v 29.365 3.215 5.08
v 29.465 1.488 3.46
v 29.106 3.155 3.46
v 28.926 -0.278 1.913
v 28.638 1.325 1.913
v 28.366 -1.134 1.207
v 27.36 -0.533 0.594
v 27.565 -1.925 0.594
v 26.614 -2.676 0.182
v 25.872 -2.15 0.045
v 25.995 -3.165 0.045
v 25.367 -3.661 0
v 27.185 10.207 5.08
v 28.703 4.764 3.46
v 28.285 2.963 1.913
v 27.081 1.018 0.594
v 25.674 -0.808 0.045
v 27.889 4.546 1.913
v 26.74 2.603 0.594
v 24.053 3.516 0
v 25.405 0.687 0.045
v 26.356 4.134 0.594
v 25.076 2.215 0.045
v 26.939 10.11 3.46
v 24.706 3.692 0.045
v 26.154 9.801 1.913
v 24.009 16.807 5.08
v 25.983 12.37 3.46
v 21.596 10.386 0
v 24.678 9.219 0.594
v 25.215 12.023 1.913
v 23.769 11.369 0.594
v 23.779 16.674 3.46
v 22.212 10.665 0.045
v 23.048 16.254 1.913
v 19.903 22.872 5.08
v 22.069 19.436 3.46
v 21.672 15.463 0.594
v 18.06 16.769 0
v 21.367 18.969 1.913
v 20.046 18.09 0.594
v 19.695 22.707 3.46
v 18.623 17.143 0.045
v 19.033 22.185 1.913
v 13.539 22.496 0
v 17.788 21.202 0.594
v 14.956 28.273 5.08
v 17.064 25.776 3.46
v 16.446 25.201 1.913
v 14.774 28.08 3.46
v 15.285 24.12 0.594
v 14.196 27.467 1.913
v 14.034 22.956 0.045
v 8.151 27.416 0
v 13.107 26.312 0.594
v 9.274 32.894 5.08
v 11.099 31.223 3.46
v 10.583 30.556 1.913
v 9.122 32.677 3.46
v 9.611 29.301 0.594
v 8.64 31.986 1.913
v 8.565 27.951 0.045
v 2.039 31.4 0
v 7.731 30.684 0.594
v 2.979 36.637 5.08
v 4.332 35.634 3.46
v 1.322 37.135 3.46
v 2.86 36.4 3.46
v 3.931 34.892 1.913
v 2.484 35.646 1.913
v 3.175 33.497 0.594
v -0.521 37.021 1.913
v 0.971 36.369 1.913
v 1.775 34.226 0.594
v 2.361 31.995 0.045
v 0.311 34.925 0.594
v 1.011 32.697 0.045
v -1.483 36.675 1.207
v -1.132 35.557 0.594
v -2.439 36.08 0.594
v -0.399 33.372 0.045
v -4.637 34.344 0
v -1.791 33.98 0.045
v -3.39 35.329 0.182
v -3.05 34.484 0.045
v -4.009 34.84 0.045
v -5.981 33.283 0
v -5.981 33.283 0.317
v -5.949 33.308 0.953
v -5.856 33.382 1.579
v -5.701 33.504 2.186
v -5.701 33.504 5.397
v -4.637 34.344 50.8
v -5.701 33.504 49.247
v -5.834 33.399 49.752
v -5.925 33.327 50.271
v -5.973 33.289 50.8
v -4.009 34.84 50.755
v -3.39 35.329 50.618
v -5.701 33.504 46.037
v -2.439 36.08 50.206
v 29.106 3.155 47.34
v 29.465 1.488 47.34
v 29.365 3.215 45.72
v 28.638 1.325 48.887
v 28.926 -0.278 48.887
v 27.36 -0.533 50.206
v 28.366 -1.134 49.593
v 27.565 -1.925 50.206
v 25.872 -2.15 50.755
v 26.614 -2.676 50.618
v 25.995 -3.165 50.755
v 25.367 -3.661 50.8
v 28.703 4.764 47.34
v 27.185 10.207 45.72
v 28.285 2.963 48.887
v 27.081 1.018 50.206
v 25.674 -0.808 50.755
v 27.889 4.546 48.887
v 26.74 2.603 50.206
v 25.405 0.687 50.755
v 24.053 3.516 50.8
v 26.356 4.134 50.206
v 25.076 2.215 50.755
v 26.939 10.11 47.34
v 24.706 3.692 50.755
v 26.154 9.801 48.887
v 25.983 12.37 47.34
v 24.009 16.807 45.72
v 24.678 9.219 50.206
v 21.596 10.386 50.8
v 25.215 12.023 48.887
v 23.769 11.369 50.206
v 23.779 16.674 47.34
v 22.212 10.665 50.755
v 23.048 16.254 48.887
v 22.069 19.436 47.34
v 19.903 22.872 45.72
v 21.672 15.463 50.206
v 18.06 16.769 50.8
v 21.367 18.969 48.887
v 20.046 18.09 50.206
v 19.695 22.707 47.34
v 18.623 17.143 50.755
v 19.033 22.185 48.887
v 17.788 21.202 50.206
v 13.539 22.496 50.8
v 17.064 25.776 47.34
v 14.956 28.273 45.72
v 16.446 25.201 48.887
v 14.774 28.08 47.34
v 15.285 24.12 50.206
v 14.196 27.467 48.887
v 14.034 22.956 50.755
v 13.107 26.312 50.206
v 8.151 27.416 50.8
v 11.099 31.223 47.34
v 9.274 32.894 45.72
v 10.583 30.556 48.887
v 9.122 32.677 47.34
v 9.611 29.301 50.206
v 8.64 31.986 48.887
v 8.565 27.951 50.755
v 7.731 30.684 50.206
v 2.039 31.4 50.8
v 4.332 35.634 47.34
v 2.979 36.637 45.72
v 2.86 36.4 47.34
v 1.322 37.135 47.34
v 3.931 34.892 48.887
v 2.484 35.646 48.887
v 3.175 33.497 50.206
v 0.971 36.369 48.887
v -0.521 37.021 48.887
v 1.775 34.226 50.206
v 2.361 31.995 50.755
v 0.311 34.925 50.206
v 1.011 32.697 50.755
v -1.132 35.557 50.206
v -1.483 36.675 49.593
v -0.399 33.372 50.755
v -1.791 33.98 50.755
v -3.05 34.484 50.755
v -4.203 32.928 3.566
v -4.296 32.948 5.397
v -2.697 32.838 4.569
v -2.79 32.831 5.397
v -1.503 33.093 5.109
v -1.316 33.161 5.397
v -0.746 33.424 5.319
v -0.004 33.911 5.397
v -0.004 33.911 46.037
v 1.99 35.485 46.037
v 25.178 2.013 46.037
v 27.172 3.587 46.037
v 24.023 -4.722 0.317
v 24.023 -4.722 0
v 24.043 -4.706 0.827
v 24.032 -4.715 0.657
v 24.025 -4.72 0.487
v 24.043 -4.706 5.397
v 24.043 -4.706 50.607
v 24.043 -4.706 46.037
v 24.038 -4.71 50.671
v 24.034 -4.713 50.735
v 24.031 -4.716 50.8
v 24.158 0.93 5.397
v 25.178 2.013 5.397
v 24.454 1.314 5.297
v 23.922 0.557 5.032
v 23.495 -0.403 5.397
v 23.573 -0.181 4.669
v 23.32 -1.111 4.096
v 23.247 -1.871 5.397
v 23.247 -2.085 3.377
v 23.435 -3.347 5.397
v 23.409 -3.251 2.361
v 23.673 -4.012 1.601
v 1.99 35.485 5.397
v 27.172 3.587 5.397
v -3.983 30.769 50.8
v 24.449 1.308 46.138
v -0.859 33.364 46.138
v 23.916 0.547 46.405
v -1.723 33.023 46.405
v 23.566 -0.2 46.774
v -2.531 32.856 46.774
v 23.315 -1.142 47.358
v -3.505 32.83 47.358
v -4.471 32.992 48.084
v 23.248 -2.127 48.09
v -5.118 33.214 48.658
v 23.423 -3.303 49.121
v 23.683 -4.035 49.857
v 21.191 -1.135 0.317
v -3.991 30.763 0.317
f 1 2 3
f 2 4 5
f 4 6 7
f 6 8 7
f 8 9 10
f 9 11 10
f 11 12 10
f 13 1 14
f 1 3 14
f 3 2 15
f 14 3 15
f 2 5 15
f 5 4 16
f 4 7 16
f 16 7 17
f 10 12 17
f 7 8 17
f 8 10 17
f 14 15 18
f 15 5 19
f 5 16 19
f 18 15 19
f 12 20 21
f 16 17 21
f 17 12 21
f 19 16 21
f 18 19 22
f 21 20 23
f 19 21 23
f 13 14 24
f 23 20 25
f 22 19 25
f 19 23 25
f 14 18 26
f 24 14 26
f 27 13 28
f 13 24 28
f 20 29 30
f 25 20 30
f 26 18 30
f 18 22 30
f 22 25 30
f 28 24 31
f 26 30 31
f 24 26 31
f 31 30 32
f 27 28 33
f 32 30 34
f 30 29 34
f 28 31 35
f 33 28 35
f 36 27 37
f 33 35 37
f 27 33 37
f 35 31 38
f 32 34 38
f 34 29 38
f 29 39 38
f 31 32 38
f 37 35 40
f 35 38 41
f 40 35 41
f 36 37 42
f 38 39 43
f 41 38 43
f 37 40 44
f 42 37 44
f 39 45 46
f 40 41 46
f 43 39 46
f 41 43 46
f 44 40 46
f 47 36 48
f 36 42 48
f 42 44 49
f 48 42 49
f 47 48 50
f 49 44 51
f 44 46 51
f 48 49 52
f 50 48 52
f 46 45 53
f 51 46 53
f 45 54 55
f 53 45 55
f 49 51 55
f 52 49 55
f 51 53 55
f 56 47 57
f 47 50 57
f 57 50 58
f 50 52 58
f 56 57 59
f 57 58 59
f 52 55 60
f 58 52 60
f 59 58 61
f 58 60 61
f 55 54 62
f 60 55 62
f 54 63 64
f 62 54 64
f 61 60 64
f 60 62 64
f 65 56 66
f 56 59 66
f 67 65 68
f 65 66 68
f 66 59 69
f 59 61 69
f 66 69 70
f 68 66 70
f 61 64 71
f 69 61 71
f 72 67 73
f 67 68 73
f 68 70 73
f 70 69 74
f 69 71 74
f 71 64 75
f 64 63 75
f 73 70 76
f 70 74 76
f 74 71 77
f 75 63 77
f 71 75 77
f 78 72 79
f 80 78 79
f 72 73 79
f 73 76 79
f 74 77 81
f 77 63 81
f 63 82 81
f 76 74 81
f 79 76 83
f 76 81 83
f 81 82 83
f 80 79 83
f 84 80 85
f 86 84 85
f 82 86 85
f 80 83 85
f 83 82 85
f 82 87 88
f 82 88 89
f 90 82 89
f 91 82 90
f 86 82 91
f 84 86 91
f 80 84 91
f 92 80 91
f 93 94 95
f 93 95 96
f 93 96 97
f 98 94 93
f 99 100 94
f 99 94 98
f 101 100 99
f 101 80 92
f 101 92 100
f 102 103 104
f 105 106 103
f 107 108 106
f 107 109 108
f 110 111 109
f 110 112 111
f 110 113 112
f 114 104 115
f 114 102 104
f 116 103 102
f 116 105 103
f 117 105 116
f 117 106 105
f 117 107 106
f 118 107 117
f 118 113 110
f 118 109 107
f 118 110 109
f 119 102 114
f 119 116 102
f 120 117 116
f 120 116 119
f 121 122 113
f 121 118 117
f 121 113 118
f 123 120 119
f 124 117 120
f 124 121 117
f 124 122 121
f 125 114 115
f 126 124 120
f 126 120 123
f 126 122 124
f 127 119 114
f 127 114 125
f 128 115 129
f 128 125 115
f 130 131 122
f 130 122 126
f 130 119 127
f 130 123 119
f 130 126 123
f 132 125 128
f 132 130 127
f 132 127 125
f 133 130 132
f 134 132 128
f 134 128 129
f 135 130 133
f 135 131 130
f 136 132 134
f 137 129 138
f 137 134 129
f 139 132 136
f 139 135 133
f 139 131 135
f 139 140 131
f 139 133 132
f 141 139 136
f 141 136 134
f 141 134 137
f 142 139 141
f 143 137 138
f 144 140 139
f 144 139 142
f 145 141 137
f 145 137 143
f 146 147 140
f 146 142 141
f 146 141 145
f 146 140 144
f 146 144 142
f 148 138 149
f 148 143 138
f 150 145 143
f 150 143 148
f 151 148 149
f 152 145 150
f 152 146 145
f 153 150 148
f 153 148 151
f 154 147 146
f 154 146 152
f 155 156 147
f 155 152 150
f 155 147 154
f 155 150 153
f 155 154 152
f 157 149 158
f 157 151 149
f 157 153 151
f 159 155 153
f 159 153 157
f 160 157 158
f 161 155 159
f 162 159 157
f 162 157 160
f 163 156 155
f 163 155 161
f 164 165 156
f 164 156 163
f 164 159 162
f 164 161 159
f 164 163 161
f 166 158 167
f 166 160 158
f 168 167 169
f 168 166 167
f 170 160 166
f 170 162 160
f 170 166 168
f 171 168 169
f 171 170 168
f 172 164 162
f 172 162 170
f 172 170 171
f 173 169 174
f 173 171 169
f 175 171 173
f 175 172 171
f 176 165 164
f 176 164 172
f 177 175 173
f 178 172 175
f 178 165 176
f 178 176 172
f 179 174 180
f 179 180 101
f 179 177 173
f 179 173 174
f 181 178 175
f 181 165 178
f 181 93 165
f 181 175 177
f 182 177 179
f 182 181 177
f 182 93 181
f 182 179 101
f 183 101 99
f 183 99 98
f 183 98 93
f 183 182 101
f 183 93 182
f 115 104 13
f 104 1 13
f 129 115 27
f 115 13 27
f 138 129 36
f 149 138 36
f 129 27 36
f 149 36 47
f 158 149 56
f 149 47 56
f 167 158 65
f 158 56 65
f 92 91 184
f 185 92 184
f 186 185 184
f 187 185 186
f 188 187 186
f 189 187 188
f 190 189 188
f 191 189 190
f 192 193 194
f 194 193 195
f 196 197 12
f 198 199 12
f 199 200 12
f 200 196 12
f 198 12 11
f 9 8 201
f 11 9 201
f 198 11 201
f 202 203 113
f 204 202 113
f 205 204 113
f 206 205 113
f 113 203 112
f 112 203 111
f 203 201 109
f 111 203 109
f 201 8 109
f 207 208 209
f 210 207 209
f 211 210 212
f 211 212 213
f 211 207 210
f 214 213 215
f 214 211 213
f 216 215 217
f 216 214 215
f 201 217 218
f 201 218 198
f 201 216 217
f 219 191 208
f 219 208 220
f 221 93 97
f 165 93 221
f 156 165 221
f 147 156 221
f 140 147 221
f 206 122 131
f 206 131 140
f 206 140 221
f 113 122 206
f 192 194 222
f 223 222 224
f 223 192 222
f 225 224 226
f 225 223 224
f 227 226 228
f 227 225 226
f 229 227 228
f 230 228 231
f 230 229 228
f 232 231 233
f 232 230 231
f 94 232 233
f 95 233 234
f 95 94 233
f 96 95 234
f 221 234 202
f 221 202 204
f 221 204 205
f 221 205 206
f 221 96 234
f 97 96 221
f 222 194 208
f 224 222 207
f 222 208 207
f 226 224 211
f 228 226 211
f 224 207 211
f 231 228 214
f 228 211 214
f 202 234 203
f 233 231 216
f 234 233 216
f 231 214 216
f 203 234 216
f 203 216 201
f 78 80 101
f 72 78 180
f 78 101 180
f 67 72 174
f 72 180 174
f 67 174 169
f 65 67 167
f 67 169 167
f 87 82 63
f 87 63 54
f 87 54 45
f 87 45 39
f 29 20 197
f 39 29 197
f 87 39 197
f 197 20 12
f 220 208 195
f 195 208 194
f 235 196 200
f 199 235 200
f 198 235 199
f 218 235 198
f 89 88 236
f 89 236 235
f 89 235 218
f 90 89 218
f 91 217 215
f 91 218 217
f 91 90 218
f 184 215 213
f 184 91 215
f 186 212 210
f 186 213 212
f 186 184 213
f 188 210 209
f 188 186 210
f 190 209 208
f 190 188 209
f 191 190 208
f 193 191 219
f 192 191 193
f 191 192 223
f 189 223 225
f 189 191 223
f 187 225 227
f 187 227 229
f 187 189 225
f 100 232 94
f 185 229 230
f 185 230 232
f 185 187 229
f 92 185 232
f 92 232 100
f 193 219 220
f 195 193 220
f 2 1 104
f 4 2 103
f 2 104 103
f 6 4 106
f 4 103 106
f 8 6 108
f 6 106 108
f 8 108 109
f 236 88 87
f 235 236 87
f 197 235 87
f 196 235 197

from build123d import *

# Parameters (mm, degrees)
F1_DEPTH     = 50.8
F2_W         = 48.4209248795
F2_H         = 50.8
F2_W_2       = 40.64
F2_H_2       = 40.64
F3_DEPTH     = 7.62
F4_T1_DEPTH  = 40.64
F4_T3_DEPTH  = 40.64
F4_T9_DEPTH  = 53.34
F4_T15_DEPTH = 53.34
F4_T24_DEPTH = 53.34
F4_T30_DEPTH = 53.34
F5_T1_DEPTH  = 40.64
F5_T6_DEPTH  = 17.2700101558
F5_S7_R      = 5.0800000001
F5_T8_DEPTH  = 13
F5_T12_DEPTH = 15.9109147238
F5_S13_R     = 5.0800000001
F5_T14_DEPTH = 12
F6_R         = 5.08


# Not quite as in the source:
# - a fillet or chamfer that OpenCascade refuses, or shapes differently, is made with other operations: its cross-section is extruded or revolved along the edge and cut away or added


with BuildPart() as f1:
    # F0 (on Top) → F1 (new body)
    with BuildSketch(Plane.XY):
        with BuildLine():
            Line((0, 38.0047485232), (30.0037506968, 0))
            ThreePointArc((30.0037506968, 0), (19.9032134253, 22.871851931), (0, 38.0047485232))
        make_face()
    extrude(amount=F1_DEPTH)

    # F2 (on face) → F3 (join)
    with BuildSketch(Plane(origin=(18.4835383706, 14.5922680406, 0), x_dir=(0.6196443123, -0.7848827468, 0), z_dir=(-0.7848827468, -0.6196443123, 0))):
        with Locations((-5.6188089735, 25.4)):
            Rectangle(F2_W, F2_H)
        with Locations((-6.2983566895, 25.7165116596)):
            Rectangle(F2_W_2, F2_H_2, mode=Mode.SUBTRACT)
    extrude(amount=F3_DEPTH)

    # F4: fillet of radius 5.08 on 3 edges, made by hand

    # F4_s2 → F4_t1 (cut)
    with BuildSketch(Plane(origin=(-16.4939133248, 20.8922889144, 0), x_dir=(0, 0, 1), z_dir=(0.6196443123, -0.7848827468, 0))):
        with BuildLine():
            ThreePointArc((46.0365116596, -21.0094262619), (47.5244092112, -17.4173238135), (51.1165116596, -15.9294262619))
            Line((51.1165116596, -15.9294262619), (46.0365116596, -15.9294262619))
            Line((46.0365116596, -15.9294262619), (46.0365116596, -21.0094262619))
        make_face()
    extrude(amount=F4_T1_DEPTH, mode=Mode.SUBTRACT)

    # F4_s4 → F4_t3 (cut)
    with BuildSketch(Plane.XY.offset(5.3965116596)):
        with BuildLine():
            ThreePointArc((25.1783677198, 2.0130255709), (23.2809557383, -1.3806253977), (24.3389564723, -5.1219718894))
            Line((24.3389564723, -5.1219718894), (21.1911633659, -1.1347675355))
            Line((21.1911633659, -1.1347675355), (25.1783677198, 2.0130255709))
        make_face()
        with BuildLine():
            ThreePointArc((-0.0039771311, 33.9106604018), (-3.7453236228, 32.8526596678), (-7.1389745914, 34.7500716493))
            Line((-7.1389745914, 34.7500716493), (-3.991181485, 30.7628672955))
            Line((-3.991181485, 30.7628672955), (-0.0039771311, 33.9106604018))
        make_face()
    extrude(amount=F4_T3_DEPTH, mode=Mode.SUBTRACT)


with BuildPart() as f4_tool7:
    # F4_s8 → F4_t9 (new body)
    with BuildSketch(Plane(origin=(-24.3633960907, 30.8602997991, 0), x_dir=(0, 0, 1), z_dir=(0.6196443123, -0.7848827468, 0))):
        with BuildLine():
            ThreePointArc((46.0365116596, -21.0094262619), (47.5244092112, -17.4173238135), (51.1165116596, -15.9294262619))
            Line((51.1165116596, -15.9294262619), (46.0365116596, -15.9294262619))
            Line((46.0365116596, -15.9294262619), (46.0365116596, -21.0094262619))
        make_face()
    extrude(amount=F4_T9_DEPTH)

    split(bisect_by=Plane(origin=(-16.4939133248, 20.8922889144, 0), x_dir=(0, 0, 1), z_dir=(-0.6196443123, 0.7848827468, 0)), keep=Keep.TOP)

    split(bisect_by=Plane.XY.offset(50.8), keep=Keep.BOTTOM)

    split(bisect_by=Plane(origin=(-18.4835383706, 23.4124804826, 0), x_dir=(0, 0, 1), z_dir=(0.6196443123, -0.7848827468, 0)), keep=Keep.TOP)


with BuildPart() as f4_tool13:
    # F4_s14 → F4_t15 (new body)
    with BuildSketch(Plane.XY.offset(5.3965116596)):
        with BuildLine():
            ThreePointArc((-0.0039771311, 33.9106604018), (-3.7453236228, 32.8526596678), (-7.1389745914, 34.7500716493))
            Line((-7.1389745914, 34.7500716493), (-3.991181485, 30.7628672955))
            Line((-3.991181485, 30.7628672955), (-0.0039771311, 33.9106604018))
        make_face()
    extrude(amount=F4_T15_DEPTH)

    split(bisect_by=Plane.XY.offset(46.0365116596), keep=Keep.TOP)

    split(bisect_by=Plane.XY.offset(50.8), keep=Keep.BOTTOM)

    split(bisect_by=Plane(origin=(-18.4835383706, 23.4124804826, 0), x_dir=(0, 0, 1), z_dir=(0.6196443123, -0.7848827468, 0)), keep=Keep.TOP)


with BuildPart() as f4_tool7_1:
    add(f4_tool7.part)

    # F4_t19: intersect F4_tool13
    add(f4_tool13.part, mode=Mode.INTERSECT)


with BuildPart() as f1_1:
    add(f1.part)

    # F4_t5: cut F4_tool7
    add(f4_tool7_1.part, mode=Mode.SUBTRACT)


with BuildPart() as f4_tool22:
    # F4_s23 → F4_t24 (new body)
    with BuildSketch(Plane(origin=(-16.4939133248, 20.8922889144, 0), x_dir=(0, 0, 1), z_dir=(0.6196443123, -0.7848827468, 0))):
        with BuildLine():
            ThreePointArc((46.0365116596, -21.0094262619), (47.5244092112, -17.4173238135), (51.1165116596, -15.9294262619))
            Line((51.1165116596, -15.9294262619), (46.0365116596, -15.9294262619))
            Line((46.0365116596, -15.9294262619), (46.0365116596, -21.0094262619))
        make_face()
    extrude(amount=F4_T24_DEPTH)

    split(bisect_by=Plane(origin=(8.6884315261, -11.0053459165, 0), x_dir=(0, 0, 1), z_dir=(0.6196443123, -0.7848827468, 0)), keep=Keep.TOP)

    split(bisect_by=Plane(origin=(11.5202123262, -14.5922680406, 0), x_dir=(0, 0, 1), z_dir=(-0.6196443123, 0.7848827468, 0)), keep=Keep.TOP)

    split(bisect_by=Plane.XY.offset(50.8), keep=Keep.BOTTOM)


with BuildPart() as f4_tool28:
    # F4_s29 → F4_t30 (new body)
    with BuildSketch(Plane.XY.offset(58.7365116596)):
        with BuildLine():
            ThreePointArc((25.1783677198, 2.0130255709), (23.2809557383, -1.3806253977), (24.3389564723, -5.1219718894))
            Line((24.3389564723, -5.1219718894), (21.1911633659, -1.1347675355))
            Line((21.1911633659, -1.1347675355), (25.1783677198, 2.0130255709))
        make_face()
    extrude(amount=-F4_T30_DEPTH)

    split(bisect_by=Plane.XY.offset(46.0365116596), keep=Keep.TOP)

    split(bisect_by=Plane(origin=(11.5202123262, -14.5922680406, 0), x_dir=(0, 0, 1), z_dir=(-0.6196443123, 0.7848827468, 0)), keep=Keep.TOP)

    split(bisect_by=Plane.XY.offset(50.8), keep=Keep.BOTTOM)


with BuildPart() as f4_tool22_1:
    add(f4_tool22.part)

    # F4_t34: intersect F4_tool28
    add(f4_tool28.part, mode=Mode.INTERSECT)


with BuildPart() as f1_2:
    add(f1_1.part)

    # F4_t20: cut F4_tool22
    add(f4_tool22_1.part, mode=Mode.SUBTRACT)

    # F5: fillet of radius 5.08 on 1 edges, made by hand

    # F5_s2 → F5_t1 (cut)
    with BuildSketch(Plane(origin=(8.6884315261, -11.0053459165, 0), x_dir=(0, 0, 1), z_dir=(-0.6196443123, 0.7848827468, 0))):
        with BuildLine():
            ThreePointArc((0.3165116596, 15.9294262619), (3.908614108, 17.4173238135), (5.3965116596, 21.0094262619))
            Line((5.3965116596, 21.0094262619), (5.3965116596, 15.9294262619))
            Line((5.3965116596, 15.9294262619), (0.3165116596, 15.9294262619))
        make_face()
    extrude(amount=F5_T1_DEPTH, mode=Mode.SUBTRACT)


with BuildPart() as f5_tool4:
    # F5_s5 → F5_t6 (new body)
    with BuildSketch(Plane(origin=(19.3896950922, -24.5602789253, 0), x_dir=(0, 0, 1), z_dir=(-0.6196443123, 0.7848827468, 0))):
        with BuildLine():
            ThreePointArc((0.3165116596, 15.9294262619), (3.908614108, 17.4173238135), (5.3965116596, 21.0094262619))
            Line((5.3965116596, 21.0094262619), (5.3965116596, 15.9294262619))
            Line((5.3965116596, 15.9294262619), (0.3165116596, 15.9294262619))
        make_face()
    extrude(amount=F5_T6_DEPTH)

    # F5_s7 → F5_t8 (cut, symmetric)
    with BuildSketch(Plane.XY.offset(2.9)):
        with Locations((28.3261608263, -1.974178783)):
            Circle(F5_S7_R)
    extrude(amount=F5_T8_DEPTH, both=True, mode=Mode.SUBTRACT)


with BuildPart() as f1_3:
    add(f1_2.part)

    # F5_t3: cut F5_tool4
    add(f5_tool4.part, mode=Mode.SUBTRACT)


with BuildPart() as f5_tool10:
    # F5_s11 → F5_t12 (new body)
    with BuildSketch(Plane(origin=(-26.3530211368, 33.3804913668, 0), x_dir=(0, 0, 1), z_dir=(0.6196443123, -0.7848827468, 0))):
        with BuildLine():
            ThreePointArc((0.3165116596, -15.9294262623), (3.908614108, -17.4173238139), (5.3965116596, -21.0094262623))
            Line((5.3965116596, -21.0094262623), (5.3965116596, -15.9294262623))
            Line((5.3965116596, -15.9294262623), (0.3165116596, -15.9294262623))
        make_face()
    extrude(amount=F5_T12_DEPTH)

    # F5_s13 → F5_t14 (cut, symmetric)
    with BuildSketch(Plane.XY.offset(2.9)):
        with Locations((-3.1517702375, 37.8978647558)):
            Circle(F5_S13_R)
    extrude(amount=F5_T14_DEPTH, both=True, mode=Mode.SUBTRACT)


with BuildPart() as f1_4:
    add(f1_3.part)

    # F5_t9: cut F5_tool10
    add(f5_tool10.part, mode=Mode.SUBTRACT)

    # F6
    f6_edges = [f1_4.edges().sort_by_distance(p)[0] for p in [
        (19.903213, 22.871852, 50.8),
        (30.003751, 0, 25.4),
        (19.903213, 22.871852, 0),
        (0, 38.004749, 25.4),
    ]]
    fillet(f6_edges, radius=F6_R)


solid = f1_4.part
